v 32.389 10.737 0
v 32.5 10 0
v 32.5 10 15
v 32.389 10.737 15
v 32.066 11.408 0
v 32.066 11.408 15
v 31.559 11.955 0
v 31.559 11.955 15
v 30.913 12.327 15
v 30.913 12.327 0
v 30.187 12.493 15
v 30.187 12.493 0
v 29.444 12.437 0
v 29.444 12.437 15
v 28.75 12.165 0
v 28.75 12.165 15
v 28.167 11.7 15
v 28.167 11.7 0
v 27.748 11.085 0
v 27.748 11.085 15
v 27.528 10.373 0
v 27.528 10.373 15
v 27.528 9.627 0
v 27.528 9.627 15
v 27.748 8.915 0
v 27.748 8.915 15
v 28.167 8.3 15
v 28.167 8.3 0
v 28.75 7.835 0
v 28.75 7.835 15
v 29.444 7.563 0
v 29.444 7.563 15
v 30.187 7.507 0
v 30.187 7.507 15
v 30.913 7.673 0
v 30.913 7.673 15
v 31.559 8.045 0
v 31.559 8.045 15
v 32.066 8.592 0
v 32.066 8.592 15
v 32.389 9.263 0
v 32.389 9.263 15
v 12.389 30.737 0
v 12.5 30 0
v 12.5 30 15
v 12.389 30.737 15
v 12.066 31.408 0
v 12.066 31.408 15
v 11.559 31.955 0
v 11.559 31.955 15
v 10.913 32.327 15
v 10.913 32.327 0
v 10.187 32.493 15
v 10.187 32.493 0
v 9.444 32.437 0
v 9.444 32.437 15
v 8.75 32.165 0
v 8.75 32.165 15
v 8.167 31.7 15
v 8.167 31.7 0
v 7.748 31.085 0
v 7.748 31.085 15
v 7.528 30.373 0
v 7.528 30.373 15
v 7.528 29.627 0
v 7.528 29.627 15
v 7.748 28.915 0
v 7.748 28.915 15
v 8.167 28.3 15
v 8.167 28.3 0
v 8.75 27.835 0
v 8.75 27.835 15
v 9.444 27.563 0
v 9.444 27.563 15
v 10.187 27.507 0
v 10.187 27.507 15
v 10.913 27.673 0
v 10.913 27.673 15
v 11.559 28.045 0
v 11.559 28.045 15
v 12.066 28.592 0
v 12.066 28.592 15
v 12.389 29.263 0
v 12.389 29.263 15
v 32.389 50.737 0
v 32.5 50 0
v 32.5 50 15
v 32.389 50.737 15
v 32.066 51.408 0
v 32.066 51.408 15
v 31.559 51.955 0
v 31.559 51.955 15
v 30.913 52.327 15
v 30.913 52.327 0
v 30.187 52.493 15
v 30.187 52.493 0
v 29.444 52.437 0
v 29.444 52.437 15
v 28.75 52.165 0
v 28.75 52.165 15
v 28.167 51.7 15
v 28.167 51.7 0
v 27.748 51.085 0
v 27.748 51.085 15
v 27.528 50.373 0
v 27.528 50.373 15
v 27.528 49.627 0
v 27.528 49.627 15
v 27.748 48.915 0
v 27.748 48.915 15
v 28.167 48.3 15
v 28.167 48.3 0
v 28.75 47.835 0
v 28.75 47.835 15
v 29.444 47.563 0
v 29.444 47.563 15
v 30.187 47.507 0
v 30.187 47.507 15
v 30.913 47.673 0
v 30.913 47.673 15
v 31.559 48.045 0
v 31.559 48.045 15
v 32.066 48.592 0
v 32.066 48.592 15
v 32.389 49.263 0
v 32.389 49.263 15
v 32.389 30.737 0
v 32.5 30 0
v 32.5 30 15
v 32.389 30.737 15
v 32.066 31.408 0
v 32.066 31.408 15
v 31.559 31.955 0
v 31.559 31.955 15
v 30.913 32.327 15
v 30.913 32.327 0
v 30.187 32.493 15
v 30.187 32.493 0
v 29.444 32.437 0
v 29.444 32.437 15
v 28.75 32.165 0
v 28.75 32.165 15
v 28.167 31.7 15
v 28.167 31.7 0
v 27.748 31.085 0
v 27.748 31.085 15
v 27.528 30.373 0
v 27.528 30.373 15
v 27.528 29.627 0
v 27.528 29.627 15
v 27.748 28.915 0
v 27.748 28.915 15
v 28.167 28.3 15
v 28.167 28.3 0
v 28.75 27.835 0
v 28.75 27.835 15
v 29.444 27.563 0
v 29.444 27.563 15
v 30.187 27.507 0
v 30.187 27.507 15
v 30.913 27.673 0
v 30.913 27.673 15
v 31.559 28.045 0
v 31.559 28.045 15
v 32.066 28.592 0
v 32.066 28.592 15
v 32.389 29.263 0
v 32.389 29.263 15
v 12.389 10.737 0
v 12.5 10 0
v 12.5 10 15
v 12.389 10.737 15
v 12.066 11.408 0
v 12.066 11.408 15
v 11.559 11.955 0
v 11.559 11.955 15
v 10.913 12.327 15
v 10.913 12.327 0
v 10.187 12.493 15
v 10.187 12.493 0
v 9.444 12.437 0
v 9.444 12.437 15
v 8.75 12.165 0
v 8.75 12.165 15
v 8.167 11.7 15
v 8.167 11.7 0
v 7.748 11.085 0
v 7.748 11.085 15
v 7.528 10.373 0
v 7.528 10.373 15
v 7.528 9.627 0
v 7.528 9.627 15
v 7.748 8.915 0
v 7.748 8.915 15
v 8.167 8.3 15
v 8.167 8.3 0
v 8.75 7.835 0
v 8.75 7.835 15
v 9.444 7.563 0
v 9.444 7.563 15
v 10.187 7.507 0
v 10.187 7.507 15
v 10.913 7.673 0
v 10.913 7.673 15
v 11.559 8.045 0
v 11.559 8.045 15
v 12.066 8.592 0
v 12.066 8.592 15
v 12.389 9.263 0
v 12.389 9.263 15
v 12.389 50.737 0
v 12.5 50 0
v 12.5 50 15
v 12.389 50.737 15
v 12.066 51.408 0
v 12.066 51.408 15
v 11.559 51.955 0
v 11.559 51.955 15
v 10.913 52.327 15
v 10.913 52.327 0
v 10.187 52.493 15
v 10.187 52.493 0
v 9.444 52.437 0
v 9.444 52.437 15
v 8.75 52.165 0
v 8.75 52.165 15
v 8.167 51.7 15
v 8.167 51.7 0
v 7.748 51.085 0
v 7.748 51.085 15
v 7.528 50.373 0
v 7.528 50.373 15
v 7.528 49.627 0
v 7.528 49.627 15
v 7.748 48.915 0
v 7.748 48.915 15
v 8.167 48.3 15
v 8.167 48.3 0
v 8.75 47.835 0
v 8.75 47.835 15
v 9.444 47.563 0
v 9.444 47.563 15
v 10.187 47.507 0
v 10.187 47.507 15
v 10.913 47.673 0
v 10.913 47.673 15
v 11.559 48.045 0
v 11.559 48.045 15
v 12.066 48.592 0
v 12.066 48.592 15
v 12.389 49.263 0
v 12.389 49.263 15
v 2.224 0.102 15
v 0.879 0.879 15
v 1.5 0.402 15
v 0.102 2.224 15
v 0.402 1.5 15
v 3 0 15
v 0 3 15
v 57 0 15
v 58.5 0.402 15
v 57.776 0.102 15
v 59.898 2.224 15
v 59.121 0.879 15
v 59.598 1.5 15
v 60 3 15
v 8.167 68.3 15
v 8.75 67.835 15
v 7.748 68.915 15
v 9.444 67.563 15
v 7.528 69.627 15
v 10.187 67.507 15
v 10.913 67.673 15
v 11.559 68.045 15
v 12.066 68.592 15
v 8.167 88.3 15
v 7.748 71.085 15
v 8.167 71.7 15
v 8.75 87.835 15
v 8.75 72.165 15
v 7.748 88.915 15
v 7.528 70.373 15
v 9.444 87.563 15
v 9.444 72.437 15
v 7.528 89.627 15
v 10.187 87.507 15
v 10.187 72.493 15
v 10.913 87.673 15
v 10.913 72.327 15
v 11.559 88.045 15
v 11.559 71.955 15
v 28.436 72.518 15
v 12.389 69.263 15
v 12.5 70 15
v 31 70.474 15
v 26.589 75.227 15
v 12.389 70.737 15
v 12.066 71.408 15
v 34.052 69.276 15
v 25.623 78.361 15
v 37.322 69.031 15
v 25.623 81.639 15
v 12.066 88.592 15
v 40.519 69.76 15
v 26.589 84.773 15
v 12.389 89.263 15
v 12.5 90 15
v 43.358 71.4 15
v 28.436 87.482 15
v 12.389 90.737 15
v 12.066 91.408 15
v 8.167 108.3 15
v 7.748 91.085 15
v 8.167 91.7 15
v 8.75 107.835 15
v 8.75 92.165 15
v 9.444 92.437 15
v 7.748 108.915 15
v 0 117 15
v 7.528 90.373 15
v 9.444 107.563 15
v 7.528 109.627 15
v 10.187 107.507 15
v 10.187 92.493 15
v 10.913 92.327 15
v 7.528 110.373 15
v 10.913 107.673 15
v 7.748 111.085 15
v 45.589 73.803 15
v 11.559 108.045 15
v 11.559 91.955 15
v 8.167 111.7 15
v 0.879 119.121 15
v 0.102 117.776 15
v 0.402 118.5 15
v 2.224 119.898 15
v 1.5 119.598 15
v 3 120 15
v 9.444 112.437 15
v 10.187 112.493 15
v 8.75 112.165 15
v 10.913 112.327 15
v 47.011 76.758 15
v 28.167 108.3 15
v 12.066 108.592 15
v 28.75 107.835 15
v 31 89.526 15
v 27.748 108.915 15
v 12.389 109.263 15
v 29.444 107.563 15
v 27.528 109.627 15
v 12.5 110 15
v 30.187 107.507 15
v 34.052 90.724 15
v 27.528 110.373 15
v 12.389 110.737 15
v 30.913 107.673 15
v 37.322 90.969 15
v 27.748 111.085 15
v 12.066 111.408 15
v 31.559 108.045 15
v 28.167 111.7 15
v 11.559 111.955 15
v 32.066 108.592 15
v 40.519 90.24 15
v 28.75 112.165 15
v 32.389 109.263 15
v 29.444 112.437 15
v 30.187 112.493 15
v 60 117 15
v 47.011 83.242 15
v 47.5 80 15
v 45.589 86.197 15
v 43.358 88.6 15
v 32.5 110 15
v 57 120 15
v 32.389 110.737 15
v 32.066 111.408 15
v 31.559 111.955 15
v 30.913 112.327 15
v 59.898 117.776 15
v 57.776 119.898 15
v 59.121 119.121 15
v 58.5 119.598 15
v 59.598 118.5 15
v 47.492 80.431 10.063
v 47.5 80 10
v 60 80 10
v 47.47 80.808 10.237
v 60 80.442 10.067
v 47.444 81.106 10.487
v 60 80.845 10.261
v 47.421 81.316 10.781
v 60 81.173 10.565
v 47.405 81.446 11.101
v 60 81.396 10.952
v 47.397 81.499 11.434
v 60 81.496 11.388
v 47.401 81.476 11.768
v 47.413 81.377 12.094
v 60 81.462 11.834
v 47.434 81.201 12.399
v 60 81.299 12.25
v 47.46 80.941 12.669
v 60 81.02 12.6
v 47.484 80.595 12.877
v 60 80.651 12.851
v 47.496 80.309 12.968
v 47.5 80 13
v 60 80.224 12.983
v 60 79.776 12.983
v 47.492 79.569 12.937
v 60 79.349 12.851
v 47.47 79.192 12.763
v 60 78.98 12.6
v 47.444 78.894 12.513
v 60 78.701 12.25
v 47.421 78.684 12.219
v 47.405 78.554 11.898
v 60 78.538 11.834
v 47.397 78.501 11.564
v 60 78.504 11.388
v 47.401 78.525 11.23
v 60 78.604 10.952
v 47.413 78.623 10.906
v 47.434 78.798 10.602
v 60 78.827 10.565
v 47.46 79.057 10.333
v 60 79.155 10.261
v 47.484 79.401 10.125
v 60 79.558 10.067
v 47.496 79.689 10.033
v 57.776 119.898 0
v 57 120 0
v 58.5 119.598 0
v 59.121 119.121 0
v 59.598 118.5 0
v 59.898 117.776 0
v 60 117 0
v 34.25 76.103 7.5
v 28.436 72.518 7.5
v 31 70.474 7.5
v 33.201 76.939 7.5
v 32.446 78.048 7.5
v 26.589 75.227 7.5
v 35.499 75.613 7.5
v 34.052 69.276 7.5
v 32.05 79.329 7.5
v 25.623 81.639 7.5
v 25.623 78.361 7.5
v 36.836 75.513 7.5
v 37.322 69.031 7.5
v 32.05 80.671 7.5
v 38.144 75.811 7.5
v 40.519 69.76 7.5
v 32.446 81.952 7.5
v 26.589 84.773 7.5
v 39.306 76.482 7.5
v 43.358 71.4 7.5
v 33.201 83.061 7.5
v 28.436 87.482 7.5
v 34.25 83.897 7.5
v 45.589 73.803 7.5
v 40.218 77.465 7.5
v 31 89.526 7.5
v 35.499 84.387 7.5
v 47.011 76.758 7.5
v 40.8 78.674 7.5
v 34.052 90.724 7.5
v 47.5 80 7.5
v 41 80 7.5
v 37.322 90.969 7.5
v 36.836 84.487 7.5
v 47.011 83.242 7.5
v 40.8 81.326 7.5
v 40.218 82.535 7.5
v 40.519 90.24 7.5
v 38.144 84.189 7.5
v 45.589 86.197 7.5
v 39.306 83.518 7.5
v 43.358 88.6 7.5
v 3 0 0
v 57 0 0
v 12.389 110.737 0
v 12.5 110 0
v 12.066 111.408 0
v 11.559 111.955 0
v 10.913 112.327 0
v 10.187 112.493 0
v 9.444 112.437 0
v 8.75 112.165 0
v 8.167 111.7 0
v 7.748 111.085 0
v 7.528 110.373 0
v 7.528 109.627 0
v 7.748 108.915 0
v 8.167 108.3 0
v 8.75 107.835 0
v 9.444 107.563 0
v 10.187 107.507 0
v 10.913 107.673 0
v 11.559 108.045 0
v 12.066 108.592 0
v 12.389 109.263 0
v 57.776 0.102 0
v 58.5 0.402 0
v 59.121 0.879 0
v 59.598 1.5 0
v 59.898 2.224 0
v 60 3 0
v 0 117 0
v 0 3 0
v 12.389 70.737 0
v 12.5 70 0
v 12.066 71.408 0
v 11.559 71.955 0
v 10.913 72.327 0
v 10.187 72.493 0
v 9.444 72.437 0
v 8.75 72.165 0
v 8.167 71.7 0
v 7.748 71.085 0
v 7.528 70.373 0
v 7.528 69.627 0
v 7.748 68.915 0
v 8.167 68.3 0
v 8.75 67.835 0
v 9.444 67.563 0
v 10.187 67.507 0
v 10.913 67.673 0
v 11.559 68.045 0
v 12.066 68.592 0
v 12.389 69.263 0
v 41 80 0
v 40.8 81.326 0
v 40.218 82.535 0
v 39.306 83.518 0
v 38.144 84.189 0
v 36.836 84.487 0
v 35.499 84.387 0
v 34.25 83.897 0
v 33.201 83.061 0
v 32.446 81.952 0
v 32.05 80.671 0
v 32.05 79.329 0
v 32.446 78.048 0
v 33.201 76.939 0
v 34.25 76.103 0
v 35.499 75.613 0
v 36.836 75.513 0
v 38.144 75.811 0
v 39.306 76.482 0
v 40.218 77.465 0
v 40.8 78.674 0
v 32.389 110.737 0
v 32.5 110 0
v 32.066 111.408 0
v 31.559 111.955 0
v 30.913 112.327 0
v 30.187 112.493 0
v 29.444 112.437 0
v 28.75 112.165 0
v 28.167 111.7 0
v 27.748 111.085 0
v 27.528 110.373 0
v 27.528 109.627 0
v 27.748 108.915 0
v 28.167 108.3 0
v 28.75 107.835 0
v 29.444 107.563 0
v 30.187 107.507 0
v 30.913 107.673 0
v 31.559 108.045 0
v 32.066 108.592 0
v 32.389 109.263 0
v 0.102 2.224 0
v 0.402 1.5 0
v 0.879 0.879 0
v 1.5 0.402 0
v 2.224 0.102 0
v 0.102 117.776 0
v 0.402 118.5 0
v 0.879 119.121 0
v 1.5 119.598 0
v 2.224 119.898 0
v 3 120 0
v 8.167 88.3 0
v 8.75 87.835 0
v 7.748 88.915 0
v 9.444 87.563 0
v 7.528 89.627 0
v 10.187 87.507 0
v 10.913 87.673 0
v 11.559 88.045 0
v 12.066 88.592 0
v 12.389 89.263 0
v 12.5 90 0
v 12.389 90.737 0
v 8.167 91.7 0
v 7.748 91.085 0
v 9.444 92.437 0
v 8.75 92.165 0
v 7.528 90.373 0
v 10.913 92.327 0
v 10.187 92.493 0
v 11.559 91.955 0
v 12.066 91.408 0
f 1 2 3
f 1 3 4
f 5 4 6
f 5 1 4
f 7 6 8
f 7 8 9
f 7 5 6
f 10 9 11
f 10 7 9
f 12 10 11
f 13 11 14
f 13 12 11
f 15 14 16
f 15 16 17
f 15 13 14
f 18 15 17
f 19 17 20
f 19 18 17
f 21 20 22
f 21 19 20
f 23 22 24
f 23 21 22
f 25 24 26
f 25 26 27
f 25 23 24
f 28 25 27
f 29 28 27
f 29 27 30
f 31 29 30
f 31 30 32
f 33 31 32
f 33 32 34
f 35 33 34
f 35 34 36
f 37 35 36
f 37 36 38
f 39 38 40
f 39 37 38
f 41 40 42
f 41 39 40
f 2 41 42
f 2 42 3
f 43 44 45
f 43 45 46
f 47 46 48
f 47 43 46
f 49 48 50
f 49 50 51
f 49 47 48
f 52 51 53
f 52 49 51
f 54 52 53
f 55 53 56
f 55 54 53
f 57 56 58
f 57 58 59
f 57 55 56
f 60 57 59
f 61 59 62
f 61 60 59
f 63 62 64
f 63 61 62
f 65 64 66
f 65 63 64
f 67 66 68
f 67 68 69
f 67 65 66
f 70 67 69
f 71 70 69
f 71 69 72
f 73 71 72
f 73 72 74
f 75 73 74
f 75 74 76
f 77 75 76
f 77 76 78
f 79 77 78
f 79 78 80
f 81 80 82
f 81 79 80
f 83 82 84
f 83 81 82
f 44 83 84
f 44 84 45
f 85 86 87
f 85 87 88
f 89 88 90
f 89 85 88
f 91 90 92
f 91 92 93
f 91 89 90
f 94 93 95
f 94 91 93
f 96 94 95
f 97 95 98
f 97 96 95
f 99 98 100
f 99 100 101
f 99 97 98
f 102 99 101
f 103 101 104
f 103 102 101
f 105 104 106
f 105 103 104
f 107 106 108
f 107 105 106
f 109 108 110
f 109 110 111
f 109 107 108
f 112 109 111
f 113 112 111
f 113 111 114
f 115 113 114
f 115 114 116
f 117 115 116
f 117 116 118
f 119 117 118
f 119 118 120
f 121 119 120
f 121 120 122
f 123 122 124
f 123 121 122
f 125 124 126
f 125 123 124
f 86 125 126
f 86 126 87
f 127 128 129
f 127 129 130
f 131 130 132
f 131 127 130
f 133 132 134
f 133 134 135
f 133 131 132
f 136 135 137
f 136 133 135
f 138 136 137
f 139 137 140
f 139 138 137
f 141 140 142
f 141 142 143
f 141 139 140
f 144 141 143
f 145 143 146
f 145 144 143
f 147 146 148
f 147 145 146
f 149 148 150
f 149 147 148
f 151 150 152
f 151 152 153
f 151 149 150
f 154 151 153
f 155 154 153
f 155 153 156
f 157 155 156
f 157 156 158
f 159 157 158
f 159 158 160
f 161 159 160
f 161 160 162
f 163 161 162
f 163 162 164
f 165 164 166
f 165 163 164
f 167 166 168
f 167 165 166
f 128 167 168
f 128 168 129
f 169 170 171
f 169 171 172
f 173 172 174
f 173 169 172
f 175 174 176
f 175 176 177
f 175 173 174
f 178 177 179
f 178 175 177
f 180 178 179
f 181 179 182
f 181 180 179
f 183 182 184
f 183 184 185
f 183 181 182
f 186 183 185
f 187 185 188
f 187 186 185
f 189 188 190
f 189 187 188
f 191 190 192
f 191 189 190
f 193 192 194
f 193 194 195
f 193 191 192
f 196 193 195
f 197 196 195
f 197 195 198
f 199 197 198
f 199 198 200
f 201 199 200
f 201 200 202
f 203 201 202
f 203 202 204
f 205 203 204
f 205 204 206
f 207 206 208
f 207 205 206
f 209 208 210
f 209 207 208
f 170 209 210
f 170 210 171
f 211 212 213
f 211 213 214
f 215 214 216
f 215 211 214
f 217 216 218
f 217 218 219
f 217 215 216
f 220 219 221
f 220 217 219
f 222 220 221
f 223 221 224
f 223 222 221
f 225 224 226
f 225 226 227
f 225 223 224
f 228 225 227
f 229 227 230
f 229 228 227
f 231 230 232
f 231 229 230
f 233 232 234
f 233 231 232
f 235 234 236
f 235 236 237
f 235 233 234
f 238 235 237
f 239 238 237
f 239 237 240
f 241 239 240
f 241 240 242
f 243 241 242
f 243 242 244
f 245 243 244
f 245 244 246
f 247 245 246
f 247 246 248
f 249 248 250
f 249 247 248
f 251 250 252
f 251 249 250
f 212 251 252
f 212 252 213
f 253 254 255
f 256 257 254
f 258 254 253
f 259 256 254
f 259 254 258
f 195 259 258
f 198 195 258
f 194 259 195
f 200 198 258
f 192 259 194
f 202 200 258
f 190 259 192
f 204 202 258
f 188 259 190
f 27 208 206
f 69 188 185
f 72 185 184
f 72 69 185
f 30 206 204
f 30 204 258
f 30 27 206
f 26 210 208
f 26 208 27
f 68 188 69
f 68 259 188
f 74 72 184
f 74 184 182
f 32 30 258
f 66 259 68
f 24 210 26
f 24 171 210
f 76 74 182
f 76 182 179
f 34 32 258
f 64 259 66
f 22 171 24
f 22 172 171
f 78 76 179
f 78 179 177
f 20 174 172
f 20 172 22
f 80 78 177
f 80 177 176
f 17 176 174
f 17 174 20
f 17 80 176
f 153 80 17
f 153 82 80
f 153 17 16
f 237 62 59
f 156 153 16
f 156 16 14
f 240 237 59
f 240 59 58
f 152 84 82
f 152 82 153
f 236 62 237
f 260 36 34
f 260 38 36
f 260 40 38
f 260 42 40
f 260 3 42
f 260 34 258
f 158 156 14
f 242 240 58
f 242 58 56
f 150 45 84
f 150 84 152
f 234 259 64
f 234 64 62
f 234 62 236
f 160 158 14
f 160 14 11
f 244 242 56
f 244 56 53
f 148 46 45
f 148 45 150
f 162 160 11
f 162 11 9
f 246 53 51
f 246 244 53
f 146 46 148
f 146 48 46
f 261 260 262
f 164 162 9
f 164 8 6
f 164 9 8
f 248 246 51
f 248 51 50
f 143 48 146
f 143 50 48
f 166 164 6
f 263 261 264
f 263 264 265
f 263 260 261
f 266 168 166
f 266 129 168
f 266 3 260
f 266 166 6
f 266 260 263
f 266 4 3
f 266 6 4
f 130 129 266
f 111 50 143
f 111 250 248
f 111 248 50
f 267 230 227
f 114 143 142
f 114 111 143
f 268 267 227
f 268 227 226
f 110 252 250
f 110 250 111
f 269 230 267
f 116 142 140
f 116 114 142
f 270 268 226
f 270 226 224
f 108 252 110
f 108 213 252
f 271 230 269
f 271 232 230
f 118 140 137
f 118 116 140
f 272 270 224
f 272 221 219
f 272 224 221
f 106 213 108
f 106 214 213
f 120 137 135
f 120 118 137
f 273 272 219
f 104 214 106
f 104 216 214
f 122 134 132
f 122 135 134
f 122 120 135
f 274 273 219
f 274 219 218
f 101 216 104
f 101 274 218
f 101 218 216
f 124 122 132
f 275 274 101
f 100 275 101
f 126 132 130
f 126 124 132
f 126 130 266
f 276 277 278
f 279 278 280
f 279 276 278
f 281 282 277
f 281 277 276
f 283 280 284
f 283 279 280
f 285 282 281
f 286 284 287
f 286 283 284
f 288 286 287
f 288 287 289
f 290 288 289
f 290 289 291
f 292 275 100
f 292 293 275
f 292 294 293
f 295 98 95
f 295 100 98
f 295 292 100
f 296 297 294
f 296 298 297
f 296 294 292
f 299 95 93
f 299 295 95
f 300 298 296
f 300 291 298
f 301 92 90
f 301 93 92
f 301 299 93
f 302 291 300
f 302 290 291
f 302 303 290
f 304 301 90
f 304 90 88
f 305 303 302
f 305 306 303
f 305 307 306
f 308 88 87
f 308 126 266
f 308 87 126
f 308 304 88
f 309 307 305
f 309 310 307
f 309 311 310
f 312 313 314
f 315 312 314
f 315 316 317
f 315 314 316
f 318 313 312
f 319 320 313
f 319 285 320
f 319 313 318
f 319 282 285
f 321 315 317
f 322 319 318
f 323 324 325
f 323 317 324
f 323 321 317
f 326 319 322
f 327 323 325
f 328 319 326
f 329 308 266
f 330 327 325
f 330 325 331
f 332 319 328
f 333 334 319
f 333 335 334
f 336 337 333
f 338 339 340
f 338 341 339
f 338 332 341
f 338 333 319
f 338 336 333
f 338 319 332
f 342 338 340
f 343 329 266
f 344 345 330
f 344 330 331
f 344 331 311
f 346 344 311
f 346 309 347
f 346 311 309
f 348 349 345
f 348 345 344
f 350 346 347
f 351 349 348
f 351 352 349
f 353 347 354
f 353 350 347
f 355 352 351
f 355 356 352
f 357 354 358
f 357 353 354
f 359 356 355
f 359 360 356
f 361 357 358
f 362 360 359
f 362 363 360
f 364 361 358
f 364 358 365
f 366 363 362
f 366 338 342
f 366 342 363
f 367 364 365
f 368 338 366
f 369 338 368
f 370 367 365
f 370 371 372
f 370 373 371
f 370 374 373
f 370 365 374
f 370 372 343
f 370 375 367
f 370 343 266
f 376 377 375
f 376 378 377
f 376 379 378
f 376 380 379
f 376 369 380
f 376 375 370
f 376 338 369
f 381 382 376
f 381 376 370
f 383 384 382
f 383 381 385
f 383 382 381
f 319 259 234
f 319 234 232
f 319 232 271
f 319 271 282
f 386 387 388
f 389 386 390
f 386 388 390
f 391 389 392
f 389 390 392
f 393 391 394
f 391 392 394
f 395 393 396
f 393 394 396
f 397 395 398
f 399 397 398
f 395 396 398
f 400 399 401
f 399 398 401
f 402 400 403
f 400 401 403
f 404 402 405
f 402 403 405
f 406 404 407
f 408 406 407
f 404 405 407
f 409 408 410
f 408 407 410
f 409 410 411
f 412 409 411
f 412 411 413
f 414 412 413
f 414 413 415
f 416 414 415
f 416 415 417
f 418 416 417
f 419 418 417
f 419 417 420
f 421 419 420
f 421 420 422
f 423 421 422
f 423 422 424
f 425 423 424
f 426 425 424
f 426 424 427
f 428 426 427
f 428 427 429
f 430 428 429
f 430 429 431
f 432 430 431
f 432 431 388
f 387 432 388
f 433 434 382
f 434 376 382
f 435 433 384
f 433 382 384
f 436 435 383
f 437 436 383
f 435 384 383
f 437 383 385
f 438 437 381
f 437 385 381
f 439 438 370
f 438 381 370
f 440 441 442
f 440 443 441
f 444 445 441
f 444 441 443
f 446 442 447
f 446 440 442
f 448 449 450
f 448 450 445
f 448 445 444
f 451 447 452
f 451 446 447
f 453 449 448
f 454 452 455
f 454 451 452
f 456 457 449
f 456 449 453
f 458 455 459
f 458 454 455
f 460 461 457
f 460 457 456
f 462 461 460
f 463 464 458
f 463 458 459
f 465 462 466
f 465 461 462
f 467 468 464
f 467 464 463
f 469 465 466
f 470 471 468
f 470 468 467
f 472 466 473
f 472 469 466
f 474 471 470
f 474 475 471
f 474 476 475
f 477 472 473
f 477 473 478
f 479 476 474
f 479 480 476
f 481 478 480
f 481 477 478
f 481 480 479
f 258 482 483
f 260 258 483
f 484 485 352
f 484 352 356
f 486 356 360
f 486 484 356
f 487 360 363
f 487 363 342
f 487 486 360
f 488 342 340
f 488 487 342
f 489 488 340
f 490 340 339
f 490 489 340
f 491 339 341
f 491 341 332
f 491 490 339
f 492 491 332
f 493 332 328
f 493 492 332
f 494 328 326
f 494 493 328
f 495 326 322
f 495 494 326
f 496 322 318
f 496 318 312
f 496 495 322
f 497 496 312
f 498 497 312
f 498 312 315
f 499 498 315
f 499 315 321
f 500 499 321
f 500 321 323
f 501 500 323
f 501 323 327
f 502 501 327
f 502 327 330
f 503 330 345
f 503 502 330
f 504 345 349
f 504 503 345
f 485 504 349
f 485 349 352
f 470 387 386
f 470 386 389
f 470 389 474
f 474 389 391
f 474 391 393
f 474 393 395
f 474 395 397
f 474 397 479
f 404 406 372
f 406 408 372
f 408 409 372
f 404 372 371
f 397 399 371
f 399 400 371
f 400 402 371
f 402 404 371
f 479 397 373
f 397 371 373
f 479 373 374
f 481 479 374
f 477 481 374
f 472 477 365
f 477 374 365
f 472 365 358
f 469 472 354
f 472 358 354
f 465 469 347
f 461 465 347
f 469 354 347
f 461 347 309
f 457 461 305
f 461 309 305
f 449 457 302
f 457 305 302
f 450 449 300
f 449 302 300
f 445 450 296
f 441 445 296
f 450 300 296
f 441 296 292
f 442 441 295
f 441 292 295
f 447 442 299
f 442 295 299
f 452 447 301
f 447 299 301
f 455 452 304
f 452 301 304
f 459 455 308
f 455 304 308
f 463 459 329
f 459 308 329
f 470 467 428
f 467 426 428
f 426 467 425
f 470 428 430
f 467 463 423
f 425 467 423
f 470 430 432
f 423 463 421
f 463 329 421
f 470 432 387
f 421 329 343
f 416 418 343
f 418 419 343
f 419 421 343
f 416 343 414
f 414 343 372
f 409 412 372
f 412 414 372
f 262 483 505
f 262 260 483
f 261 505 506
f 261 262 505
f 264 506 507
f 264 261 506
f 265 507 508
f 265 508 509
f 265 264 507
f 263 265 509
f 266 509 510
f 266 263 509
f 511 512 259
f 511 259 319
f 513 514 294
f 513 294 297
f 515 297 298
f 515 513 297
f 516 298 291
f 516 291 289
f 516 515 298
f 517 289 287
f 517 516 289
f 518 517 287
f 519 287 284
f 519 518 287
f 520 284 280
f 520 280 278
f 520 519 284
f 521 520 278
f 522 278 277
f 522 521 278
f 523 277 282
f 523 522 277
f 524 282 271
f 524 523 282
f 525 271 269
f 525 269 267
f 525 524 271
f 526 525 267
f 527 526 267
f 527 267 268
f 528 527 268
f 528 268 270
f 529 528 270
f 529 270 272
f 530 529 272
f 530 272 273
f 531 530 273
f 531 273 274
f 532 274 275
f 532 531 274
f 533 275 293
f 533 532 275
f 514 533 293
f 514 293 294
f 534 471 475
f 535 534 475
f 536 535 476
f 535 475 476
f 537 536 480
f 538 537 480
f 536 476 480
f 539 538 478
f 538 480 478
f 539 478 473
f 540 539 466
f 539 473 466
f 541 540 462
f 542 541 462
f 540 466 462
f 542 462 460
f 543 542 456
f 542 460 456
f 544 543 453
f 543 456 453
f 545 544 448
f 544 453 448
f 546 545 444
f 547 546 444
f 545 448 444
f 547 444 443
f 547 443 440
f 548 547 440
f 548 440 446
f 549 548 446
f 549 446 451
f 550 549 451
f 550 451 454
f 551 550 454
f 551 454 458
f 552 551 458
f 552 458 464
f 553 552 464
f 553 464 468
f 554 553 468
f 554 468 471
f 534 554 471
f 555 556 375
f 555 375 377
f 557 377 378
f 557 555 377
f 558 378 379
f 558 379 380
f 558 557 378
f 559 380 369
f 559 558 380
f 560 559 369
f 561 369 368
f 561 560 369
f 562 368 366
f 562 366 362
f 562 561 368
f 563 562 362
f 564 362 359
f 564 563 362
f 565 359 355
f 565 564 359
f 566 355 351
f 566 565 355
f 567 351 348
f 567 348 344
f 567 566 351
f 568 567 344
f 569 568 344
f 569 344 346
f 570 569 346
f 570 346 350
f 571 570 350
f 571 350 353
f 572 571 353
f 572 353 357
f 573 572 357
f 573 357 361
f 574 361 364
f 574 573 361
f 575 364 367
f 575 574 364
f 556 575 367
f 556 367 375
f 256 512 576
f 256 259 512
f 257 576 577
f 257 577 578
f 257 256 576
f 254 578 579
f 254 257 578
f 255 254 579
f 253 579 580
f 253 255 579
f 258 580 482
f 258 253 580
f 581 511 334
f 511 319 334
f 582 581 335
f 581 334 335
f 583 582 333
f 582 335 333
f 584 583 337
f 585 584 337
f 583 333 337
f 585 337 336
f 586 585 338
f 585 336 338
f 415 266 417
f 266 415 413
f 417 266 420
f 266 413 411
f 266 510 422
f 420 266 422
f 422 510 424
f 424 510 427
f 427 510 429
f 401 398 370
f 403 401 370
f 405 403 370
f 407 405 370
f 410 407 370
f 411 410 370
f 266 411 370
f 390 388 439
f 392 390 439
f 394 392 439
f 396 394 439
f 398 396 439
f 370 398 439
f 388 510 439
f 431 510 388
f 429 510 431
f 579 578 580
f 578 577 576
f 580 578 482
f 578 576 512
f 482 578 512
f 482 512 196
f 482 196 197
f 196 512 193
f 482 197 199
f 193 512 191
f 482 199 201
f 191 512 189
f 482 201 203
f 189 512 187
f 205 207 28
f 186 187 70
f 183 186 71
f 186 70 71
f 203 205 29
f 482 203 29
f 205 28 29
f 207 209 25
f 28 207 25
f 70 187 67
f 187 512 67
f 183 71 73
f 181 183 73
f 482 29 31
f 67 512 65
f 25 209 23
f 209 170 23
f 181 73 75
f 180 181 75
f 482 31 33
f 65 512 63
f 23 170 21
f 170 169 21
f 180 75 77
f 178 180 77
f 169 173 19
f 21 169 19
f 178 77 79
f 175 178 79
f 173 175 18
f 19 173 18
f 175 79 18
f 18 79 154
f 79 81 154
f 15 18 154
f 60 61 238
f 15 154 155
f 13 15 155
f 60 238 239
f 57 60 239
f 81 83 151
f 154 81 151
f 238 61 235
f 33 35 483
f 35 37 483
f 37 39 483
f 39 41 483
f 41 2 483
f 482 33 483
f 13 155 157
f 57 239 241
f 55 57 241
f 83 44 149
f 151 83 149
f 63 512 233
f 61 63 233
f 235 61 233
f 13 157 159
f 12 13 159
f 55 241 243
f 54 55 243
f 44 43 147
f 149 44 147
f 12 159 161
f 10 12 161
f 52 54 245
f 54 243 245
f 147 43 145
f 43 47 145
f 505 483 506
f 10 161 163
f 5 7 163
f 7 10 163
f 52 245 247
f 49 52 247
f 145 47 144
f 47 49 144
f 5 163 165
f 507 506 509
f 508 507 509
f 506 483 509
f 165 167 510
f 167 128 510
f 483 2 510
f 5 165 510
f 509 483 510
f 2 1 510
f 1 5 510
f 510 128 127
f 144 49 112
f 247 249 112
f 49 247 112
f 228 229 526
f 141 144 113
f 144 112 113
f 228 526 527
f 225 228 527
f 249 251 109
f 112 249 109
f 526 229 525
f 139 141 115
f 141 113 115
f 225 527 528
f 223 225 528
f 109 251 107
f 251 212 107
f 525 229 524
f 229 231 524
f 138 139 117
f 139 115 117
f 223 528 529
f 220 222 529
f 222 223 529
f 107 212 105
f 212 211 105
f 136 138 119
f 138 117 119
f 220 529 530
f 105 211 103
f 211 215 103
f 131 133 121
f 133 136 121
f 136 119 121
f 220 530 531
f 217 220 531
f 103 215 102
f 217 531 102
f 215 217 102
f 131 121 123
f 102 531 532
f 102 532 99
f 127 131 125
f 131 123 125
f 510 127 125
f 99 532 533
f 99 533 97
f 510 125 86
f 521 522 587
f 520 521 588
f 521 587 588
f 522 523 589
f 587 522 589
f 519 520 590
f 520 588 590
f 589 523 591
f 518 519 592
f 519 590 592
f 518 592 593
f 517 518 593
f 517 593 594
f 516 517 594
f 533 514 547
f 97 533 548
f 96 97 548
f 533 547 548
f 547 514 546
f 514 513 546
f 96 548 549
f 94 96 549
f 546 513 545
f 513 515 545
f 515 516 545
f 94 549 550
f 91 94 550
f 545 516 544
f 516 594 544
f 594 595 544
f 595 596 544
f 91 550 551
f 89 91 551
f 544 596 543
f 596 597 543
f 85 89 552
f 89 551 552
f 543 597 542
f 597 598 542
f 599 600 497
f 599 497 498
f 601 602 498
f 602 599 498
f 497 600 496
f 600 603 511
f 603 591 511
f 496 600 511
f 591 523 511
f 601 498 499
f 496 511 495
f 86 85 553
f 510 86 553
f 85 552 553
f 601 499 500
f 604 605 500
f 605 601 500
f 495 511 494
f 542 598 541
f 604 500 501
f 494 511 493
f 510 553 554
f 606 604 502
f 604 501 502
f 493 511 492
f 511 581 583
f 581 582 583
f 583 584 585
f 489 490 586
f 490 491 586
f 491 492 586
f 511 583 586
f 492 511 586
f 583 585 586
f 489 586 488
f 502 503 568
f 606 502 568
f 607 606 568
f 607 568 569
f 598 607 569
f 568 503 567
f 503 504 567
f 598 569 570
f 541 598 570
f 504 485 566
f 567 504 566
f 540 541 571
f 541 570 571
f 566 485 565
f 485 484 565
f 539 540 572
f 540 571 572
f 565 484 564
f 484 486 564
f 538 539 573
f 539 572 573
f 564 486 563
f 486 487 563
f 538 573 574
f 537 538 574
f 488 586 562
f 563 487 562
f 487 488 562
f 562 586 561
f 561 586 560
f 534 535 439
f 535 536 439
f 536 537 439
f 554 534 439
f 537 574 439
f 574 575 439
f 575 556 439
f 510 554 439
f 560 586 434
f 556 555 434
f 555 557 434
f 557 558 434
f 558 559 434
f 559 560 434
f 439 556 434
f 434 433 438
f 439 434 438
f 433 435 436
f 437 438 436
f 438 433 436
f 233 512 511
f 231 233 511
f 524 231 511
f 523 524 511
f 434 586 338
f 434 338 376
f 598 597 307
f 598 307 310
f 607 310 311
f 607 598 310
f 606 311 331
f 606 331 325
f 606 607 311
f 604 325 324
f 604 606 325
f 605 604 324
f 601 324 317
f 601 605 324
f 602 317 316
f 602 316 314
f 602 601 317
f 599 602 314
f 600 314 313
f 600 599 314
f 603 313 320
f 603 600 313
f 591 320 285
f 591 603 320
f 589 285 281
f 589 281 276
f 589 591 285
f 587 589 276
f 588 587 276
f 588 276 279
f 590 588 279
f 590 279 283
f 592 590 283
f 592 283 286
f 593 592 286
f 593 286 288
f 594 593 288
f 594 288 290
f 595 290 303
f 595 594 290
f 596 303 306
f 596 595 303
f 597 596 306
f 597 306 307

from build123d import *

# Parameters (mm, degrees)
SKETCH1_W               = 60
SKETCH1_H               = 120
SKETCH1_R               = 2.5
BOSS_EXTRUDE1_DEPTH     = 15
FILLET1_R               = 3
SKETCH2_R               = 4.5
CUT_EXTRUDE1_DEPTH      = 136
SKETCH2_3_R             = 11
SKETCH2_3_R_2           = 4.5
CUT_EXTRUDE2_DEPTH      = 7.5
CUT_EXTRUDE3_REACH      = 137
CUT_EXTRUDE3_END_RADIUS = 11
SKETCH3_R               = 1.5


with BuildPart() as part:
    # Sketch1 → Boss-Extrude1 (new body)
    with BuildSketch(Plane.XY):
        with Locations((30, 60)):
            Rectangle(SKETCH1_W, SKETCH1_H)
        with Locations((10, 110)):
            Circle(SKETCH1_R, mode=Mode.SUBTRACT)
        with Locations((30, 110)):
            Circle(SKETCH1_R, mode=Mode.SUBTRACT)
        with Locations((10, 90)):
            Circle(SKETCH1_R, mode=Mode.SUBTRACT)
        with Locations((10, 70)):
            Circle(SKETCH1_R, mode=Mode.SUBTRACT)
        with Locations((10, 10)):
            Circle(SKETCH1_R, mode=Mode.SUBTRACT)
        with Locations((30, 10)):
            Circle(SKETCH1_R, mode=Mode.SUBTRACT)
        with Locations((30, 50)):
            Circle(SKETCH1_R, mode=Mode.SUBTRACT)
        with Locations((10, 50)):
            Circle(SKETCH1_R, mode=Mode.SUBTRACT)
        with Locations((10, 30)):
            Circle(SKETCH1_R, mode=Mode.SUBTRACT)
        with Locations((30, 30)):
            Circle(SKETCH1_R, mode=Mode.SUBTRACT)
    extrude(amount=BOSS_EXTRUDE1_DEPTH)

    # Fillet1
    fillet1_edges = [part.edges().sort_by_distance(p)[0] for p in [
        (0, 120, 7.5),
        (60, 120, 7.5),
        (60, 0, 7.5),
        (0, 0, 7.5),
    ]]
    fillet(fillet1_edges, radius=FILLET1_R)

    # Sketch2 → Cut-Extrude1 (cut, through all)
    with BuildSketch(Plane.XY.offset(15)):
        with Locations((36.5, 80)):
            Circle(SKETCH2_R)
    extrude(amount=-CUT_EXTRUDE1_DEPTH, mode=Mode.SUBTRACT)

    # Sketch2<3> → Cut-Extrude2 (cut)
    with BuildSketch(Plane.XY.offset(15)):
        with Locations((36.5, 80)):
            Circle(SKETCH2_3_R)
        with Locations((36.5, 80)):
            Circle(SKETCH2_3_R_2, mode=Mode.SUBTRACT)
    extrude(amount=-CUT_EXTRUDE2_DEPTH, mode=Mode.SUBTRACT)

    # Cut-Extrude3: up to this cylinder (the profile starts outside it)
    cut_extrude3_end = Plane(origin=(36.5, 80, 11.5), z_dir=(0, 0, 1)) * Cylinder(CUT_EXTRUDE3_END_RADIUS, 297, mode=Mode.PRIVATE)
    # Sketch3 → Cut-Extrude3 (cut, up to the surface)
    with BuildSketch(Plane(origin=(60, 0, 0), x_dir=(0, 0, -1), z_dir=(1, 0, 0)), mode=Mode.PRIVATE) as cut_extrude3_sk1:
        with Locations((-11.5, 80)):
            Circle(SKETCH3_R)
    cut_extrude3_tool1 = extrude(cut_extrude3_sk1.sketch, amount=-CUT_EXTRUDE3_REACH, mode=Mode.PRIVATE) - cut_extrude3_end
    add(cut_extrude3_tool1.solids().sort_by_distance((60, 80, 11.5))[0], mode=Mode.SUBTRACT)


solid = part.part
